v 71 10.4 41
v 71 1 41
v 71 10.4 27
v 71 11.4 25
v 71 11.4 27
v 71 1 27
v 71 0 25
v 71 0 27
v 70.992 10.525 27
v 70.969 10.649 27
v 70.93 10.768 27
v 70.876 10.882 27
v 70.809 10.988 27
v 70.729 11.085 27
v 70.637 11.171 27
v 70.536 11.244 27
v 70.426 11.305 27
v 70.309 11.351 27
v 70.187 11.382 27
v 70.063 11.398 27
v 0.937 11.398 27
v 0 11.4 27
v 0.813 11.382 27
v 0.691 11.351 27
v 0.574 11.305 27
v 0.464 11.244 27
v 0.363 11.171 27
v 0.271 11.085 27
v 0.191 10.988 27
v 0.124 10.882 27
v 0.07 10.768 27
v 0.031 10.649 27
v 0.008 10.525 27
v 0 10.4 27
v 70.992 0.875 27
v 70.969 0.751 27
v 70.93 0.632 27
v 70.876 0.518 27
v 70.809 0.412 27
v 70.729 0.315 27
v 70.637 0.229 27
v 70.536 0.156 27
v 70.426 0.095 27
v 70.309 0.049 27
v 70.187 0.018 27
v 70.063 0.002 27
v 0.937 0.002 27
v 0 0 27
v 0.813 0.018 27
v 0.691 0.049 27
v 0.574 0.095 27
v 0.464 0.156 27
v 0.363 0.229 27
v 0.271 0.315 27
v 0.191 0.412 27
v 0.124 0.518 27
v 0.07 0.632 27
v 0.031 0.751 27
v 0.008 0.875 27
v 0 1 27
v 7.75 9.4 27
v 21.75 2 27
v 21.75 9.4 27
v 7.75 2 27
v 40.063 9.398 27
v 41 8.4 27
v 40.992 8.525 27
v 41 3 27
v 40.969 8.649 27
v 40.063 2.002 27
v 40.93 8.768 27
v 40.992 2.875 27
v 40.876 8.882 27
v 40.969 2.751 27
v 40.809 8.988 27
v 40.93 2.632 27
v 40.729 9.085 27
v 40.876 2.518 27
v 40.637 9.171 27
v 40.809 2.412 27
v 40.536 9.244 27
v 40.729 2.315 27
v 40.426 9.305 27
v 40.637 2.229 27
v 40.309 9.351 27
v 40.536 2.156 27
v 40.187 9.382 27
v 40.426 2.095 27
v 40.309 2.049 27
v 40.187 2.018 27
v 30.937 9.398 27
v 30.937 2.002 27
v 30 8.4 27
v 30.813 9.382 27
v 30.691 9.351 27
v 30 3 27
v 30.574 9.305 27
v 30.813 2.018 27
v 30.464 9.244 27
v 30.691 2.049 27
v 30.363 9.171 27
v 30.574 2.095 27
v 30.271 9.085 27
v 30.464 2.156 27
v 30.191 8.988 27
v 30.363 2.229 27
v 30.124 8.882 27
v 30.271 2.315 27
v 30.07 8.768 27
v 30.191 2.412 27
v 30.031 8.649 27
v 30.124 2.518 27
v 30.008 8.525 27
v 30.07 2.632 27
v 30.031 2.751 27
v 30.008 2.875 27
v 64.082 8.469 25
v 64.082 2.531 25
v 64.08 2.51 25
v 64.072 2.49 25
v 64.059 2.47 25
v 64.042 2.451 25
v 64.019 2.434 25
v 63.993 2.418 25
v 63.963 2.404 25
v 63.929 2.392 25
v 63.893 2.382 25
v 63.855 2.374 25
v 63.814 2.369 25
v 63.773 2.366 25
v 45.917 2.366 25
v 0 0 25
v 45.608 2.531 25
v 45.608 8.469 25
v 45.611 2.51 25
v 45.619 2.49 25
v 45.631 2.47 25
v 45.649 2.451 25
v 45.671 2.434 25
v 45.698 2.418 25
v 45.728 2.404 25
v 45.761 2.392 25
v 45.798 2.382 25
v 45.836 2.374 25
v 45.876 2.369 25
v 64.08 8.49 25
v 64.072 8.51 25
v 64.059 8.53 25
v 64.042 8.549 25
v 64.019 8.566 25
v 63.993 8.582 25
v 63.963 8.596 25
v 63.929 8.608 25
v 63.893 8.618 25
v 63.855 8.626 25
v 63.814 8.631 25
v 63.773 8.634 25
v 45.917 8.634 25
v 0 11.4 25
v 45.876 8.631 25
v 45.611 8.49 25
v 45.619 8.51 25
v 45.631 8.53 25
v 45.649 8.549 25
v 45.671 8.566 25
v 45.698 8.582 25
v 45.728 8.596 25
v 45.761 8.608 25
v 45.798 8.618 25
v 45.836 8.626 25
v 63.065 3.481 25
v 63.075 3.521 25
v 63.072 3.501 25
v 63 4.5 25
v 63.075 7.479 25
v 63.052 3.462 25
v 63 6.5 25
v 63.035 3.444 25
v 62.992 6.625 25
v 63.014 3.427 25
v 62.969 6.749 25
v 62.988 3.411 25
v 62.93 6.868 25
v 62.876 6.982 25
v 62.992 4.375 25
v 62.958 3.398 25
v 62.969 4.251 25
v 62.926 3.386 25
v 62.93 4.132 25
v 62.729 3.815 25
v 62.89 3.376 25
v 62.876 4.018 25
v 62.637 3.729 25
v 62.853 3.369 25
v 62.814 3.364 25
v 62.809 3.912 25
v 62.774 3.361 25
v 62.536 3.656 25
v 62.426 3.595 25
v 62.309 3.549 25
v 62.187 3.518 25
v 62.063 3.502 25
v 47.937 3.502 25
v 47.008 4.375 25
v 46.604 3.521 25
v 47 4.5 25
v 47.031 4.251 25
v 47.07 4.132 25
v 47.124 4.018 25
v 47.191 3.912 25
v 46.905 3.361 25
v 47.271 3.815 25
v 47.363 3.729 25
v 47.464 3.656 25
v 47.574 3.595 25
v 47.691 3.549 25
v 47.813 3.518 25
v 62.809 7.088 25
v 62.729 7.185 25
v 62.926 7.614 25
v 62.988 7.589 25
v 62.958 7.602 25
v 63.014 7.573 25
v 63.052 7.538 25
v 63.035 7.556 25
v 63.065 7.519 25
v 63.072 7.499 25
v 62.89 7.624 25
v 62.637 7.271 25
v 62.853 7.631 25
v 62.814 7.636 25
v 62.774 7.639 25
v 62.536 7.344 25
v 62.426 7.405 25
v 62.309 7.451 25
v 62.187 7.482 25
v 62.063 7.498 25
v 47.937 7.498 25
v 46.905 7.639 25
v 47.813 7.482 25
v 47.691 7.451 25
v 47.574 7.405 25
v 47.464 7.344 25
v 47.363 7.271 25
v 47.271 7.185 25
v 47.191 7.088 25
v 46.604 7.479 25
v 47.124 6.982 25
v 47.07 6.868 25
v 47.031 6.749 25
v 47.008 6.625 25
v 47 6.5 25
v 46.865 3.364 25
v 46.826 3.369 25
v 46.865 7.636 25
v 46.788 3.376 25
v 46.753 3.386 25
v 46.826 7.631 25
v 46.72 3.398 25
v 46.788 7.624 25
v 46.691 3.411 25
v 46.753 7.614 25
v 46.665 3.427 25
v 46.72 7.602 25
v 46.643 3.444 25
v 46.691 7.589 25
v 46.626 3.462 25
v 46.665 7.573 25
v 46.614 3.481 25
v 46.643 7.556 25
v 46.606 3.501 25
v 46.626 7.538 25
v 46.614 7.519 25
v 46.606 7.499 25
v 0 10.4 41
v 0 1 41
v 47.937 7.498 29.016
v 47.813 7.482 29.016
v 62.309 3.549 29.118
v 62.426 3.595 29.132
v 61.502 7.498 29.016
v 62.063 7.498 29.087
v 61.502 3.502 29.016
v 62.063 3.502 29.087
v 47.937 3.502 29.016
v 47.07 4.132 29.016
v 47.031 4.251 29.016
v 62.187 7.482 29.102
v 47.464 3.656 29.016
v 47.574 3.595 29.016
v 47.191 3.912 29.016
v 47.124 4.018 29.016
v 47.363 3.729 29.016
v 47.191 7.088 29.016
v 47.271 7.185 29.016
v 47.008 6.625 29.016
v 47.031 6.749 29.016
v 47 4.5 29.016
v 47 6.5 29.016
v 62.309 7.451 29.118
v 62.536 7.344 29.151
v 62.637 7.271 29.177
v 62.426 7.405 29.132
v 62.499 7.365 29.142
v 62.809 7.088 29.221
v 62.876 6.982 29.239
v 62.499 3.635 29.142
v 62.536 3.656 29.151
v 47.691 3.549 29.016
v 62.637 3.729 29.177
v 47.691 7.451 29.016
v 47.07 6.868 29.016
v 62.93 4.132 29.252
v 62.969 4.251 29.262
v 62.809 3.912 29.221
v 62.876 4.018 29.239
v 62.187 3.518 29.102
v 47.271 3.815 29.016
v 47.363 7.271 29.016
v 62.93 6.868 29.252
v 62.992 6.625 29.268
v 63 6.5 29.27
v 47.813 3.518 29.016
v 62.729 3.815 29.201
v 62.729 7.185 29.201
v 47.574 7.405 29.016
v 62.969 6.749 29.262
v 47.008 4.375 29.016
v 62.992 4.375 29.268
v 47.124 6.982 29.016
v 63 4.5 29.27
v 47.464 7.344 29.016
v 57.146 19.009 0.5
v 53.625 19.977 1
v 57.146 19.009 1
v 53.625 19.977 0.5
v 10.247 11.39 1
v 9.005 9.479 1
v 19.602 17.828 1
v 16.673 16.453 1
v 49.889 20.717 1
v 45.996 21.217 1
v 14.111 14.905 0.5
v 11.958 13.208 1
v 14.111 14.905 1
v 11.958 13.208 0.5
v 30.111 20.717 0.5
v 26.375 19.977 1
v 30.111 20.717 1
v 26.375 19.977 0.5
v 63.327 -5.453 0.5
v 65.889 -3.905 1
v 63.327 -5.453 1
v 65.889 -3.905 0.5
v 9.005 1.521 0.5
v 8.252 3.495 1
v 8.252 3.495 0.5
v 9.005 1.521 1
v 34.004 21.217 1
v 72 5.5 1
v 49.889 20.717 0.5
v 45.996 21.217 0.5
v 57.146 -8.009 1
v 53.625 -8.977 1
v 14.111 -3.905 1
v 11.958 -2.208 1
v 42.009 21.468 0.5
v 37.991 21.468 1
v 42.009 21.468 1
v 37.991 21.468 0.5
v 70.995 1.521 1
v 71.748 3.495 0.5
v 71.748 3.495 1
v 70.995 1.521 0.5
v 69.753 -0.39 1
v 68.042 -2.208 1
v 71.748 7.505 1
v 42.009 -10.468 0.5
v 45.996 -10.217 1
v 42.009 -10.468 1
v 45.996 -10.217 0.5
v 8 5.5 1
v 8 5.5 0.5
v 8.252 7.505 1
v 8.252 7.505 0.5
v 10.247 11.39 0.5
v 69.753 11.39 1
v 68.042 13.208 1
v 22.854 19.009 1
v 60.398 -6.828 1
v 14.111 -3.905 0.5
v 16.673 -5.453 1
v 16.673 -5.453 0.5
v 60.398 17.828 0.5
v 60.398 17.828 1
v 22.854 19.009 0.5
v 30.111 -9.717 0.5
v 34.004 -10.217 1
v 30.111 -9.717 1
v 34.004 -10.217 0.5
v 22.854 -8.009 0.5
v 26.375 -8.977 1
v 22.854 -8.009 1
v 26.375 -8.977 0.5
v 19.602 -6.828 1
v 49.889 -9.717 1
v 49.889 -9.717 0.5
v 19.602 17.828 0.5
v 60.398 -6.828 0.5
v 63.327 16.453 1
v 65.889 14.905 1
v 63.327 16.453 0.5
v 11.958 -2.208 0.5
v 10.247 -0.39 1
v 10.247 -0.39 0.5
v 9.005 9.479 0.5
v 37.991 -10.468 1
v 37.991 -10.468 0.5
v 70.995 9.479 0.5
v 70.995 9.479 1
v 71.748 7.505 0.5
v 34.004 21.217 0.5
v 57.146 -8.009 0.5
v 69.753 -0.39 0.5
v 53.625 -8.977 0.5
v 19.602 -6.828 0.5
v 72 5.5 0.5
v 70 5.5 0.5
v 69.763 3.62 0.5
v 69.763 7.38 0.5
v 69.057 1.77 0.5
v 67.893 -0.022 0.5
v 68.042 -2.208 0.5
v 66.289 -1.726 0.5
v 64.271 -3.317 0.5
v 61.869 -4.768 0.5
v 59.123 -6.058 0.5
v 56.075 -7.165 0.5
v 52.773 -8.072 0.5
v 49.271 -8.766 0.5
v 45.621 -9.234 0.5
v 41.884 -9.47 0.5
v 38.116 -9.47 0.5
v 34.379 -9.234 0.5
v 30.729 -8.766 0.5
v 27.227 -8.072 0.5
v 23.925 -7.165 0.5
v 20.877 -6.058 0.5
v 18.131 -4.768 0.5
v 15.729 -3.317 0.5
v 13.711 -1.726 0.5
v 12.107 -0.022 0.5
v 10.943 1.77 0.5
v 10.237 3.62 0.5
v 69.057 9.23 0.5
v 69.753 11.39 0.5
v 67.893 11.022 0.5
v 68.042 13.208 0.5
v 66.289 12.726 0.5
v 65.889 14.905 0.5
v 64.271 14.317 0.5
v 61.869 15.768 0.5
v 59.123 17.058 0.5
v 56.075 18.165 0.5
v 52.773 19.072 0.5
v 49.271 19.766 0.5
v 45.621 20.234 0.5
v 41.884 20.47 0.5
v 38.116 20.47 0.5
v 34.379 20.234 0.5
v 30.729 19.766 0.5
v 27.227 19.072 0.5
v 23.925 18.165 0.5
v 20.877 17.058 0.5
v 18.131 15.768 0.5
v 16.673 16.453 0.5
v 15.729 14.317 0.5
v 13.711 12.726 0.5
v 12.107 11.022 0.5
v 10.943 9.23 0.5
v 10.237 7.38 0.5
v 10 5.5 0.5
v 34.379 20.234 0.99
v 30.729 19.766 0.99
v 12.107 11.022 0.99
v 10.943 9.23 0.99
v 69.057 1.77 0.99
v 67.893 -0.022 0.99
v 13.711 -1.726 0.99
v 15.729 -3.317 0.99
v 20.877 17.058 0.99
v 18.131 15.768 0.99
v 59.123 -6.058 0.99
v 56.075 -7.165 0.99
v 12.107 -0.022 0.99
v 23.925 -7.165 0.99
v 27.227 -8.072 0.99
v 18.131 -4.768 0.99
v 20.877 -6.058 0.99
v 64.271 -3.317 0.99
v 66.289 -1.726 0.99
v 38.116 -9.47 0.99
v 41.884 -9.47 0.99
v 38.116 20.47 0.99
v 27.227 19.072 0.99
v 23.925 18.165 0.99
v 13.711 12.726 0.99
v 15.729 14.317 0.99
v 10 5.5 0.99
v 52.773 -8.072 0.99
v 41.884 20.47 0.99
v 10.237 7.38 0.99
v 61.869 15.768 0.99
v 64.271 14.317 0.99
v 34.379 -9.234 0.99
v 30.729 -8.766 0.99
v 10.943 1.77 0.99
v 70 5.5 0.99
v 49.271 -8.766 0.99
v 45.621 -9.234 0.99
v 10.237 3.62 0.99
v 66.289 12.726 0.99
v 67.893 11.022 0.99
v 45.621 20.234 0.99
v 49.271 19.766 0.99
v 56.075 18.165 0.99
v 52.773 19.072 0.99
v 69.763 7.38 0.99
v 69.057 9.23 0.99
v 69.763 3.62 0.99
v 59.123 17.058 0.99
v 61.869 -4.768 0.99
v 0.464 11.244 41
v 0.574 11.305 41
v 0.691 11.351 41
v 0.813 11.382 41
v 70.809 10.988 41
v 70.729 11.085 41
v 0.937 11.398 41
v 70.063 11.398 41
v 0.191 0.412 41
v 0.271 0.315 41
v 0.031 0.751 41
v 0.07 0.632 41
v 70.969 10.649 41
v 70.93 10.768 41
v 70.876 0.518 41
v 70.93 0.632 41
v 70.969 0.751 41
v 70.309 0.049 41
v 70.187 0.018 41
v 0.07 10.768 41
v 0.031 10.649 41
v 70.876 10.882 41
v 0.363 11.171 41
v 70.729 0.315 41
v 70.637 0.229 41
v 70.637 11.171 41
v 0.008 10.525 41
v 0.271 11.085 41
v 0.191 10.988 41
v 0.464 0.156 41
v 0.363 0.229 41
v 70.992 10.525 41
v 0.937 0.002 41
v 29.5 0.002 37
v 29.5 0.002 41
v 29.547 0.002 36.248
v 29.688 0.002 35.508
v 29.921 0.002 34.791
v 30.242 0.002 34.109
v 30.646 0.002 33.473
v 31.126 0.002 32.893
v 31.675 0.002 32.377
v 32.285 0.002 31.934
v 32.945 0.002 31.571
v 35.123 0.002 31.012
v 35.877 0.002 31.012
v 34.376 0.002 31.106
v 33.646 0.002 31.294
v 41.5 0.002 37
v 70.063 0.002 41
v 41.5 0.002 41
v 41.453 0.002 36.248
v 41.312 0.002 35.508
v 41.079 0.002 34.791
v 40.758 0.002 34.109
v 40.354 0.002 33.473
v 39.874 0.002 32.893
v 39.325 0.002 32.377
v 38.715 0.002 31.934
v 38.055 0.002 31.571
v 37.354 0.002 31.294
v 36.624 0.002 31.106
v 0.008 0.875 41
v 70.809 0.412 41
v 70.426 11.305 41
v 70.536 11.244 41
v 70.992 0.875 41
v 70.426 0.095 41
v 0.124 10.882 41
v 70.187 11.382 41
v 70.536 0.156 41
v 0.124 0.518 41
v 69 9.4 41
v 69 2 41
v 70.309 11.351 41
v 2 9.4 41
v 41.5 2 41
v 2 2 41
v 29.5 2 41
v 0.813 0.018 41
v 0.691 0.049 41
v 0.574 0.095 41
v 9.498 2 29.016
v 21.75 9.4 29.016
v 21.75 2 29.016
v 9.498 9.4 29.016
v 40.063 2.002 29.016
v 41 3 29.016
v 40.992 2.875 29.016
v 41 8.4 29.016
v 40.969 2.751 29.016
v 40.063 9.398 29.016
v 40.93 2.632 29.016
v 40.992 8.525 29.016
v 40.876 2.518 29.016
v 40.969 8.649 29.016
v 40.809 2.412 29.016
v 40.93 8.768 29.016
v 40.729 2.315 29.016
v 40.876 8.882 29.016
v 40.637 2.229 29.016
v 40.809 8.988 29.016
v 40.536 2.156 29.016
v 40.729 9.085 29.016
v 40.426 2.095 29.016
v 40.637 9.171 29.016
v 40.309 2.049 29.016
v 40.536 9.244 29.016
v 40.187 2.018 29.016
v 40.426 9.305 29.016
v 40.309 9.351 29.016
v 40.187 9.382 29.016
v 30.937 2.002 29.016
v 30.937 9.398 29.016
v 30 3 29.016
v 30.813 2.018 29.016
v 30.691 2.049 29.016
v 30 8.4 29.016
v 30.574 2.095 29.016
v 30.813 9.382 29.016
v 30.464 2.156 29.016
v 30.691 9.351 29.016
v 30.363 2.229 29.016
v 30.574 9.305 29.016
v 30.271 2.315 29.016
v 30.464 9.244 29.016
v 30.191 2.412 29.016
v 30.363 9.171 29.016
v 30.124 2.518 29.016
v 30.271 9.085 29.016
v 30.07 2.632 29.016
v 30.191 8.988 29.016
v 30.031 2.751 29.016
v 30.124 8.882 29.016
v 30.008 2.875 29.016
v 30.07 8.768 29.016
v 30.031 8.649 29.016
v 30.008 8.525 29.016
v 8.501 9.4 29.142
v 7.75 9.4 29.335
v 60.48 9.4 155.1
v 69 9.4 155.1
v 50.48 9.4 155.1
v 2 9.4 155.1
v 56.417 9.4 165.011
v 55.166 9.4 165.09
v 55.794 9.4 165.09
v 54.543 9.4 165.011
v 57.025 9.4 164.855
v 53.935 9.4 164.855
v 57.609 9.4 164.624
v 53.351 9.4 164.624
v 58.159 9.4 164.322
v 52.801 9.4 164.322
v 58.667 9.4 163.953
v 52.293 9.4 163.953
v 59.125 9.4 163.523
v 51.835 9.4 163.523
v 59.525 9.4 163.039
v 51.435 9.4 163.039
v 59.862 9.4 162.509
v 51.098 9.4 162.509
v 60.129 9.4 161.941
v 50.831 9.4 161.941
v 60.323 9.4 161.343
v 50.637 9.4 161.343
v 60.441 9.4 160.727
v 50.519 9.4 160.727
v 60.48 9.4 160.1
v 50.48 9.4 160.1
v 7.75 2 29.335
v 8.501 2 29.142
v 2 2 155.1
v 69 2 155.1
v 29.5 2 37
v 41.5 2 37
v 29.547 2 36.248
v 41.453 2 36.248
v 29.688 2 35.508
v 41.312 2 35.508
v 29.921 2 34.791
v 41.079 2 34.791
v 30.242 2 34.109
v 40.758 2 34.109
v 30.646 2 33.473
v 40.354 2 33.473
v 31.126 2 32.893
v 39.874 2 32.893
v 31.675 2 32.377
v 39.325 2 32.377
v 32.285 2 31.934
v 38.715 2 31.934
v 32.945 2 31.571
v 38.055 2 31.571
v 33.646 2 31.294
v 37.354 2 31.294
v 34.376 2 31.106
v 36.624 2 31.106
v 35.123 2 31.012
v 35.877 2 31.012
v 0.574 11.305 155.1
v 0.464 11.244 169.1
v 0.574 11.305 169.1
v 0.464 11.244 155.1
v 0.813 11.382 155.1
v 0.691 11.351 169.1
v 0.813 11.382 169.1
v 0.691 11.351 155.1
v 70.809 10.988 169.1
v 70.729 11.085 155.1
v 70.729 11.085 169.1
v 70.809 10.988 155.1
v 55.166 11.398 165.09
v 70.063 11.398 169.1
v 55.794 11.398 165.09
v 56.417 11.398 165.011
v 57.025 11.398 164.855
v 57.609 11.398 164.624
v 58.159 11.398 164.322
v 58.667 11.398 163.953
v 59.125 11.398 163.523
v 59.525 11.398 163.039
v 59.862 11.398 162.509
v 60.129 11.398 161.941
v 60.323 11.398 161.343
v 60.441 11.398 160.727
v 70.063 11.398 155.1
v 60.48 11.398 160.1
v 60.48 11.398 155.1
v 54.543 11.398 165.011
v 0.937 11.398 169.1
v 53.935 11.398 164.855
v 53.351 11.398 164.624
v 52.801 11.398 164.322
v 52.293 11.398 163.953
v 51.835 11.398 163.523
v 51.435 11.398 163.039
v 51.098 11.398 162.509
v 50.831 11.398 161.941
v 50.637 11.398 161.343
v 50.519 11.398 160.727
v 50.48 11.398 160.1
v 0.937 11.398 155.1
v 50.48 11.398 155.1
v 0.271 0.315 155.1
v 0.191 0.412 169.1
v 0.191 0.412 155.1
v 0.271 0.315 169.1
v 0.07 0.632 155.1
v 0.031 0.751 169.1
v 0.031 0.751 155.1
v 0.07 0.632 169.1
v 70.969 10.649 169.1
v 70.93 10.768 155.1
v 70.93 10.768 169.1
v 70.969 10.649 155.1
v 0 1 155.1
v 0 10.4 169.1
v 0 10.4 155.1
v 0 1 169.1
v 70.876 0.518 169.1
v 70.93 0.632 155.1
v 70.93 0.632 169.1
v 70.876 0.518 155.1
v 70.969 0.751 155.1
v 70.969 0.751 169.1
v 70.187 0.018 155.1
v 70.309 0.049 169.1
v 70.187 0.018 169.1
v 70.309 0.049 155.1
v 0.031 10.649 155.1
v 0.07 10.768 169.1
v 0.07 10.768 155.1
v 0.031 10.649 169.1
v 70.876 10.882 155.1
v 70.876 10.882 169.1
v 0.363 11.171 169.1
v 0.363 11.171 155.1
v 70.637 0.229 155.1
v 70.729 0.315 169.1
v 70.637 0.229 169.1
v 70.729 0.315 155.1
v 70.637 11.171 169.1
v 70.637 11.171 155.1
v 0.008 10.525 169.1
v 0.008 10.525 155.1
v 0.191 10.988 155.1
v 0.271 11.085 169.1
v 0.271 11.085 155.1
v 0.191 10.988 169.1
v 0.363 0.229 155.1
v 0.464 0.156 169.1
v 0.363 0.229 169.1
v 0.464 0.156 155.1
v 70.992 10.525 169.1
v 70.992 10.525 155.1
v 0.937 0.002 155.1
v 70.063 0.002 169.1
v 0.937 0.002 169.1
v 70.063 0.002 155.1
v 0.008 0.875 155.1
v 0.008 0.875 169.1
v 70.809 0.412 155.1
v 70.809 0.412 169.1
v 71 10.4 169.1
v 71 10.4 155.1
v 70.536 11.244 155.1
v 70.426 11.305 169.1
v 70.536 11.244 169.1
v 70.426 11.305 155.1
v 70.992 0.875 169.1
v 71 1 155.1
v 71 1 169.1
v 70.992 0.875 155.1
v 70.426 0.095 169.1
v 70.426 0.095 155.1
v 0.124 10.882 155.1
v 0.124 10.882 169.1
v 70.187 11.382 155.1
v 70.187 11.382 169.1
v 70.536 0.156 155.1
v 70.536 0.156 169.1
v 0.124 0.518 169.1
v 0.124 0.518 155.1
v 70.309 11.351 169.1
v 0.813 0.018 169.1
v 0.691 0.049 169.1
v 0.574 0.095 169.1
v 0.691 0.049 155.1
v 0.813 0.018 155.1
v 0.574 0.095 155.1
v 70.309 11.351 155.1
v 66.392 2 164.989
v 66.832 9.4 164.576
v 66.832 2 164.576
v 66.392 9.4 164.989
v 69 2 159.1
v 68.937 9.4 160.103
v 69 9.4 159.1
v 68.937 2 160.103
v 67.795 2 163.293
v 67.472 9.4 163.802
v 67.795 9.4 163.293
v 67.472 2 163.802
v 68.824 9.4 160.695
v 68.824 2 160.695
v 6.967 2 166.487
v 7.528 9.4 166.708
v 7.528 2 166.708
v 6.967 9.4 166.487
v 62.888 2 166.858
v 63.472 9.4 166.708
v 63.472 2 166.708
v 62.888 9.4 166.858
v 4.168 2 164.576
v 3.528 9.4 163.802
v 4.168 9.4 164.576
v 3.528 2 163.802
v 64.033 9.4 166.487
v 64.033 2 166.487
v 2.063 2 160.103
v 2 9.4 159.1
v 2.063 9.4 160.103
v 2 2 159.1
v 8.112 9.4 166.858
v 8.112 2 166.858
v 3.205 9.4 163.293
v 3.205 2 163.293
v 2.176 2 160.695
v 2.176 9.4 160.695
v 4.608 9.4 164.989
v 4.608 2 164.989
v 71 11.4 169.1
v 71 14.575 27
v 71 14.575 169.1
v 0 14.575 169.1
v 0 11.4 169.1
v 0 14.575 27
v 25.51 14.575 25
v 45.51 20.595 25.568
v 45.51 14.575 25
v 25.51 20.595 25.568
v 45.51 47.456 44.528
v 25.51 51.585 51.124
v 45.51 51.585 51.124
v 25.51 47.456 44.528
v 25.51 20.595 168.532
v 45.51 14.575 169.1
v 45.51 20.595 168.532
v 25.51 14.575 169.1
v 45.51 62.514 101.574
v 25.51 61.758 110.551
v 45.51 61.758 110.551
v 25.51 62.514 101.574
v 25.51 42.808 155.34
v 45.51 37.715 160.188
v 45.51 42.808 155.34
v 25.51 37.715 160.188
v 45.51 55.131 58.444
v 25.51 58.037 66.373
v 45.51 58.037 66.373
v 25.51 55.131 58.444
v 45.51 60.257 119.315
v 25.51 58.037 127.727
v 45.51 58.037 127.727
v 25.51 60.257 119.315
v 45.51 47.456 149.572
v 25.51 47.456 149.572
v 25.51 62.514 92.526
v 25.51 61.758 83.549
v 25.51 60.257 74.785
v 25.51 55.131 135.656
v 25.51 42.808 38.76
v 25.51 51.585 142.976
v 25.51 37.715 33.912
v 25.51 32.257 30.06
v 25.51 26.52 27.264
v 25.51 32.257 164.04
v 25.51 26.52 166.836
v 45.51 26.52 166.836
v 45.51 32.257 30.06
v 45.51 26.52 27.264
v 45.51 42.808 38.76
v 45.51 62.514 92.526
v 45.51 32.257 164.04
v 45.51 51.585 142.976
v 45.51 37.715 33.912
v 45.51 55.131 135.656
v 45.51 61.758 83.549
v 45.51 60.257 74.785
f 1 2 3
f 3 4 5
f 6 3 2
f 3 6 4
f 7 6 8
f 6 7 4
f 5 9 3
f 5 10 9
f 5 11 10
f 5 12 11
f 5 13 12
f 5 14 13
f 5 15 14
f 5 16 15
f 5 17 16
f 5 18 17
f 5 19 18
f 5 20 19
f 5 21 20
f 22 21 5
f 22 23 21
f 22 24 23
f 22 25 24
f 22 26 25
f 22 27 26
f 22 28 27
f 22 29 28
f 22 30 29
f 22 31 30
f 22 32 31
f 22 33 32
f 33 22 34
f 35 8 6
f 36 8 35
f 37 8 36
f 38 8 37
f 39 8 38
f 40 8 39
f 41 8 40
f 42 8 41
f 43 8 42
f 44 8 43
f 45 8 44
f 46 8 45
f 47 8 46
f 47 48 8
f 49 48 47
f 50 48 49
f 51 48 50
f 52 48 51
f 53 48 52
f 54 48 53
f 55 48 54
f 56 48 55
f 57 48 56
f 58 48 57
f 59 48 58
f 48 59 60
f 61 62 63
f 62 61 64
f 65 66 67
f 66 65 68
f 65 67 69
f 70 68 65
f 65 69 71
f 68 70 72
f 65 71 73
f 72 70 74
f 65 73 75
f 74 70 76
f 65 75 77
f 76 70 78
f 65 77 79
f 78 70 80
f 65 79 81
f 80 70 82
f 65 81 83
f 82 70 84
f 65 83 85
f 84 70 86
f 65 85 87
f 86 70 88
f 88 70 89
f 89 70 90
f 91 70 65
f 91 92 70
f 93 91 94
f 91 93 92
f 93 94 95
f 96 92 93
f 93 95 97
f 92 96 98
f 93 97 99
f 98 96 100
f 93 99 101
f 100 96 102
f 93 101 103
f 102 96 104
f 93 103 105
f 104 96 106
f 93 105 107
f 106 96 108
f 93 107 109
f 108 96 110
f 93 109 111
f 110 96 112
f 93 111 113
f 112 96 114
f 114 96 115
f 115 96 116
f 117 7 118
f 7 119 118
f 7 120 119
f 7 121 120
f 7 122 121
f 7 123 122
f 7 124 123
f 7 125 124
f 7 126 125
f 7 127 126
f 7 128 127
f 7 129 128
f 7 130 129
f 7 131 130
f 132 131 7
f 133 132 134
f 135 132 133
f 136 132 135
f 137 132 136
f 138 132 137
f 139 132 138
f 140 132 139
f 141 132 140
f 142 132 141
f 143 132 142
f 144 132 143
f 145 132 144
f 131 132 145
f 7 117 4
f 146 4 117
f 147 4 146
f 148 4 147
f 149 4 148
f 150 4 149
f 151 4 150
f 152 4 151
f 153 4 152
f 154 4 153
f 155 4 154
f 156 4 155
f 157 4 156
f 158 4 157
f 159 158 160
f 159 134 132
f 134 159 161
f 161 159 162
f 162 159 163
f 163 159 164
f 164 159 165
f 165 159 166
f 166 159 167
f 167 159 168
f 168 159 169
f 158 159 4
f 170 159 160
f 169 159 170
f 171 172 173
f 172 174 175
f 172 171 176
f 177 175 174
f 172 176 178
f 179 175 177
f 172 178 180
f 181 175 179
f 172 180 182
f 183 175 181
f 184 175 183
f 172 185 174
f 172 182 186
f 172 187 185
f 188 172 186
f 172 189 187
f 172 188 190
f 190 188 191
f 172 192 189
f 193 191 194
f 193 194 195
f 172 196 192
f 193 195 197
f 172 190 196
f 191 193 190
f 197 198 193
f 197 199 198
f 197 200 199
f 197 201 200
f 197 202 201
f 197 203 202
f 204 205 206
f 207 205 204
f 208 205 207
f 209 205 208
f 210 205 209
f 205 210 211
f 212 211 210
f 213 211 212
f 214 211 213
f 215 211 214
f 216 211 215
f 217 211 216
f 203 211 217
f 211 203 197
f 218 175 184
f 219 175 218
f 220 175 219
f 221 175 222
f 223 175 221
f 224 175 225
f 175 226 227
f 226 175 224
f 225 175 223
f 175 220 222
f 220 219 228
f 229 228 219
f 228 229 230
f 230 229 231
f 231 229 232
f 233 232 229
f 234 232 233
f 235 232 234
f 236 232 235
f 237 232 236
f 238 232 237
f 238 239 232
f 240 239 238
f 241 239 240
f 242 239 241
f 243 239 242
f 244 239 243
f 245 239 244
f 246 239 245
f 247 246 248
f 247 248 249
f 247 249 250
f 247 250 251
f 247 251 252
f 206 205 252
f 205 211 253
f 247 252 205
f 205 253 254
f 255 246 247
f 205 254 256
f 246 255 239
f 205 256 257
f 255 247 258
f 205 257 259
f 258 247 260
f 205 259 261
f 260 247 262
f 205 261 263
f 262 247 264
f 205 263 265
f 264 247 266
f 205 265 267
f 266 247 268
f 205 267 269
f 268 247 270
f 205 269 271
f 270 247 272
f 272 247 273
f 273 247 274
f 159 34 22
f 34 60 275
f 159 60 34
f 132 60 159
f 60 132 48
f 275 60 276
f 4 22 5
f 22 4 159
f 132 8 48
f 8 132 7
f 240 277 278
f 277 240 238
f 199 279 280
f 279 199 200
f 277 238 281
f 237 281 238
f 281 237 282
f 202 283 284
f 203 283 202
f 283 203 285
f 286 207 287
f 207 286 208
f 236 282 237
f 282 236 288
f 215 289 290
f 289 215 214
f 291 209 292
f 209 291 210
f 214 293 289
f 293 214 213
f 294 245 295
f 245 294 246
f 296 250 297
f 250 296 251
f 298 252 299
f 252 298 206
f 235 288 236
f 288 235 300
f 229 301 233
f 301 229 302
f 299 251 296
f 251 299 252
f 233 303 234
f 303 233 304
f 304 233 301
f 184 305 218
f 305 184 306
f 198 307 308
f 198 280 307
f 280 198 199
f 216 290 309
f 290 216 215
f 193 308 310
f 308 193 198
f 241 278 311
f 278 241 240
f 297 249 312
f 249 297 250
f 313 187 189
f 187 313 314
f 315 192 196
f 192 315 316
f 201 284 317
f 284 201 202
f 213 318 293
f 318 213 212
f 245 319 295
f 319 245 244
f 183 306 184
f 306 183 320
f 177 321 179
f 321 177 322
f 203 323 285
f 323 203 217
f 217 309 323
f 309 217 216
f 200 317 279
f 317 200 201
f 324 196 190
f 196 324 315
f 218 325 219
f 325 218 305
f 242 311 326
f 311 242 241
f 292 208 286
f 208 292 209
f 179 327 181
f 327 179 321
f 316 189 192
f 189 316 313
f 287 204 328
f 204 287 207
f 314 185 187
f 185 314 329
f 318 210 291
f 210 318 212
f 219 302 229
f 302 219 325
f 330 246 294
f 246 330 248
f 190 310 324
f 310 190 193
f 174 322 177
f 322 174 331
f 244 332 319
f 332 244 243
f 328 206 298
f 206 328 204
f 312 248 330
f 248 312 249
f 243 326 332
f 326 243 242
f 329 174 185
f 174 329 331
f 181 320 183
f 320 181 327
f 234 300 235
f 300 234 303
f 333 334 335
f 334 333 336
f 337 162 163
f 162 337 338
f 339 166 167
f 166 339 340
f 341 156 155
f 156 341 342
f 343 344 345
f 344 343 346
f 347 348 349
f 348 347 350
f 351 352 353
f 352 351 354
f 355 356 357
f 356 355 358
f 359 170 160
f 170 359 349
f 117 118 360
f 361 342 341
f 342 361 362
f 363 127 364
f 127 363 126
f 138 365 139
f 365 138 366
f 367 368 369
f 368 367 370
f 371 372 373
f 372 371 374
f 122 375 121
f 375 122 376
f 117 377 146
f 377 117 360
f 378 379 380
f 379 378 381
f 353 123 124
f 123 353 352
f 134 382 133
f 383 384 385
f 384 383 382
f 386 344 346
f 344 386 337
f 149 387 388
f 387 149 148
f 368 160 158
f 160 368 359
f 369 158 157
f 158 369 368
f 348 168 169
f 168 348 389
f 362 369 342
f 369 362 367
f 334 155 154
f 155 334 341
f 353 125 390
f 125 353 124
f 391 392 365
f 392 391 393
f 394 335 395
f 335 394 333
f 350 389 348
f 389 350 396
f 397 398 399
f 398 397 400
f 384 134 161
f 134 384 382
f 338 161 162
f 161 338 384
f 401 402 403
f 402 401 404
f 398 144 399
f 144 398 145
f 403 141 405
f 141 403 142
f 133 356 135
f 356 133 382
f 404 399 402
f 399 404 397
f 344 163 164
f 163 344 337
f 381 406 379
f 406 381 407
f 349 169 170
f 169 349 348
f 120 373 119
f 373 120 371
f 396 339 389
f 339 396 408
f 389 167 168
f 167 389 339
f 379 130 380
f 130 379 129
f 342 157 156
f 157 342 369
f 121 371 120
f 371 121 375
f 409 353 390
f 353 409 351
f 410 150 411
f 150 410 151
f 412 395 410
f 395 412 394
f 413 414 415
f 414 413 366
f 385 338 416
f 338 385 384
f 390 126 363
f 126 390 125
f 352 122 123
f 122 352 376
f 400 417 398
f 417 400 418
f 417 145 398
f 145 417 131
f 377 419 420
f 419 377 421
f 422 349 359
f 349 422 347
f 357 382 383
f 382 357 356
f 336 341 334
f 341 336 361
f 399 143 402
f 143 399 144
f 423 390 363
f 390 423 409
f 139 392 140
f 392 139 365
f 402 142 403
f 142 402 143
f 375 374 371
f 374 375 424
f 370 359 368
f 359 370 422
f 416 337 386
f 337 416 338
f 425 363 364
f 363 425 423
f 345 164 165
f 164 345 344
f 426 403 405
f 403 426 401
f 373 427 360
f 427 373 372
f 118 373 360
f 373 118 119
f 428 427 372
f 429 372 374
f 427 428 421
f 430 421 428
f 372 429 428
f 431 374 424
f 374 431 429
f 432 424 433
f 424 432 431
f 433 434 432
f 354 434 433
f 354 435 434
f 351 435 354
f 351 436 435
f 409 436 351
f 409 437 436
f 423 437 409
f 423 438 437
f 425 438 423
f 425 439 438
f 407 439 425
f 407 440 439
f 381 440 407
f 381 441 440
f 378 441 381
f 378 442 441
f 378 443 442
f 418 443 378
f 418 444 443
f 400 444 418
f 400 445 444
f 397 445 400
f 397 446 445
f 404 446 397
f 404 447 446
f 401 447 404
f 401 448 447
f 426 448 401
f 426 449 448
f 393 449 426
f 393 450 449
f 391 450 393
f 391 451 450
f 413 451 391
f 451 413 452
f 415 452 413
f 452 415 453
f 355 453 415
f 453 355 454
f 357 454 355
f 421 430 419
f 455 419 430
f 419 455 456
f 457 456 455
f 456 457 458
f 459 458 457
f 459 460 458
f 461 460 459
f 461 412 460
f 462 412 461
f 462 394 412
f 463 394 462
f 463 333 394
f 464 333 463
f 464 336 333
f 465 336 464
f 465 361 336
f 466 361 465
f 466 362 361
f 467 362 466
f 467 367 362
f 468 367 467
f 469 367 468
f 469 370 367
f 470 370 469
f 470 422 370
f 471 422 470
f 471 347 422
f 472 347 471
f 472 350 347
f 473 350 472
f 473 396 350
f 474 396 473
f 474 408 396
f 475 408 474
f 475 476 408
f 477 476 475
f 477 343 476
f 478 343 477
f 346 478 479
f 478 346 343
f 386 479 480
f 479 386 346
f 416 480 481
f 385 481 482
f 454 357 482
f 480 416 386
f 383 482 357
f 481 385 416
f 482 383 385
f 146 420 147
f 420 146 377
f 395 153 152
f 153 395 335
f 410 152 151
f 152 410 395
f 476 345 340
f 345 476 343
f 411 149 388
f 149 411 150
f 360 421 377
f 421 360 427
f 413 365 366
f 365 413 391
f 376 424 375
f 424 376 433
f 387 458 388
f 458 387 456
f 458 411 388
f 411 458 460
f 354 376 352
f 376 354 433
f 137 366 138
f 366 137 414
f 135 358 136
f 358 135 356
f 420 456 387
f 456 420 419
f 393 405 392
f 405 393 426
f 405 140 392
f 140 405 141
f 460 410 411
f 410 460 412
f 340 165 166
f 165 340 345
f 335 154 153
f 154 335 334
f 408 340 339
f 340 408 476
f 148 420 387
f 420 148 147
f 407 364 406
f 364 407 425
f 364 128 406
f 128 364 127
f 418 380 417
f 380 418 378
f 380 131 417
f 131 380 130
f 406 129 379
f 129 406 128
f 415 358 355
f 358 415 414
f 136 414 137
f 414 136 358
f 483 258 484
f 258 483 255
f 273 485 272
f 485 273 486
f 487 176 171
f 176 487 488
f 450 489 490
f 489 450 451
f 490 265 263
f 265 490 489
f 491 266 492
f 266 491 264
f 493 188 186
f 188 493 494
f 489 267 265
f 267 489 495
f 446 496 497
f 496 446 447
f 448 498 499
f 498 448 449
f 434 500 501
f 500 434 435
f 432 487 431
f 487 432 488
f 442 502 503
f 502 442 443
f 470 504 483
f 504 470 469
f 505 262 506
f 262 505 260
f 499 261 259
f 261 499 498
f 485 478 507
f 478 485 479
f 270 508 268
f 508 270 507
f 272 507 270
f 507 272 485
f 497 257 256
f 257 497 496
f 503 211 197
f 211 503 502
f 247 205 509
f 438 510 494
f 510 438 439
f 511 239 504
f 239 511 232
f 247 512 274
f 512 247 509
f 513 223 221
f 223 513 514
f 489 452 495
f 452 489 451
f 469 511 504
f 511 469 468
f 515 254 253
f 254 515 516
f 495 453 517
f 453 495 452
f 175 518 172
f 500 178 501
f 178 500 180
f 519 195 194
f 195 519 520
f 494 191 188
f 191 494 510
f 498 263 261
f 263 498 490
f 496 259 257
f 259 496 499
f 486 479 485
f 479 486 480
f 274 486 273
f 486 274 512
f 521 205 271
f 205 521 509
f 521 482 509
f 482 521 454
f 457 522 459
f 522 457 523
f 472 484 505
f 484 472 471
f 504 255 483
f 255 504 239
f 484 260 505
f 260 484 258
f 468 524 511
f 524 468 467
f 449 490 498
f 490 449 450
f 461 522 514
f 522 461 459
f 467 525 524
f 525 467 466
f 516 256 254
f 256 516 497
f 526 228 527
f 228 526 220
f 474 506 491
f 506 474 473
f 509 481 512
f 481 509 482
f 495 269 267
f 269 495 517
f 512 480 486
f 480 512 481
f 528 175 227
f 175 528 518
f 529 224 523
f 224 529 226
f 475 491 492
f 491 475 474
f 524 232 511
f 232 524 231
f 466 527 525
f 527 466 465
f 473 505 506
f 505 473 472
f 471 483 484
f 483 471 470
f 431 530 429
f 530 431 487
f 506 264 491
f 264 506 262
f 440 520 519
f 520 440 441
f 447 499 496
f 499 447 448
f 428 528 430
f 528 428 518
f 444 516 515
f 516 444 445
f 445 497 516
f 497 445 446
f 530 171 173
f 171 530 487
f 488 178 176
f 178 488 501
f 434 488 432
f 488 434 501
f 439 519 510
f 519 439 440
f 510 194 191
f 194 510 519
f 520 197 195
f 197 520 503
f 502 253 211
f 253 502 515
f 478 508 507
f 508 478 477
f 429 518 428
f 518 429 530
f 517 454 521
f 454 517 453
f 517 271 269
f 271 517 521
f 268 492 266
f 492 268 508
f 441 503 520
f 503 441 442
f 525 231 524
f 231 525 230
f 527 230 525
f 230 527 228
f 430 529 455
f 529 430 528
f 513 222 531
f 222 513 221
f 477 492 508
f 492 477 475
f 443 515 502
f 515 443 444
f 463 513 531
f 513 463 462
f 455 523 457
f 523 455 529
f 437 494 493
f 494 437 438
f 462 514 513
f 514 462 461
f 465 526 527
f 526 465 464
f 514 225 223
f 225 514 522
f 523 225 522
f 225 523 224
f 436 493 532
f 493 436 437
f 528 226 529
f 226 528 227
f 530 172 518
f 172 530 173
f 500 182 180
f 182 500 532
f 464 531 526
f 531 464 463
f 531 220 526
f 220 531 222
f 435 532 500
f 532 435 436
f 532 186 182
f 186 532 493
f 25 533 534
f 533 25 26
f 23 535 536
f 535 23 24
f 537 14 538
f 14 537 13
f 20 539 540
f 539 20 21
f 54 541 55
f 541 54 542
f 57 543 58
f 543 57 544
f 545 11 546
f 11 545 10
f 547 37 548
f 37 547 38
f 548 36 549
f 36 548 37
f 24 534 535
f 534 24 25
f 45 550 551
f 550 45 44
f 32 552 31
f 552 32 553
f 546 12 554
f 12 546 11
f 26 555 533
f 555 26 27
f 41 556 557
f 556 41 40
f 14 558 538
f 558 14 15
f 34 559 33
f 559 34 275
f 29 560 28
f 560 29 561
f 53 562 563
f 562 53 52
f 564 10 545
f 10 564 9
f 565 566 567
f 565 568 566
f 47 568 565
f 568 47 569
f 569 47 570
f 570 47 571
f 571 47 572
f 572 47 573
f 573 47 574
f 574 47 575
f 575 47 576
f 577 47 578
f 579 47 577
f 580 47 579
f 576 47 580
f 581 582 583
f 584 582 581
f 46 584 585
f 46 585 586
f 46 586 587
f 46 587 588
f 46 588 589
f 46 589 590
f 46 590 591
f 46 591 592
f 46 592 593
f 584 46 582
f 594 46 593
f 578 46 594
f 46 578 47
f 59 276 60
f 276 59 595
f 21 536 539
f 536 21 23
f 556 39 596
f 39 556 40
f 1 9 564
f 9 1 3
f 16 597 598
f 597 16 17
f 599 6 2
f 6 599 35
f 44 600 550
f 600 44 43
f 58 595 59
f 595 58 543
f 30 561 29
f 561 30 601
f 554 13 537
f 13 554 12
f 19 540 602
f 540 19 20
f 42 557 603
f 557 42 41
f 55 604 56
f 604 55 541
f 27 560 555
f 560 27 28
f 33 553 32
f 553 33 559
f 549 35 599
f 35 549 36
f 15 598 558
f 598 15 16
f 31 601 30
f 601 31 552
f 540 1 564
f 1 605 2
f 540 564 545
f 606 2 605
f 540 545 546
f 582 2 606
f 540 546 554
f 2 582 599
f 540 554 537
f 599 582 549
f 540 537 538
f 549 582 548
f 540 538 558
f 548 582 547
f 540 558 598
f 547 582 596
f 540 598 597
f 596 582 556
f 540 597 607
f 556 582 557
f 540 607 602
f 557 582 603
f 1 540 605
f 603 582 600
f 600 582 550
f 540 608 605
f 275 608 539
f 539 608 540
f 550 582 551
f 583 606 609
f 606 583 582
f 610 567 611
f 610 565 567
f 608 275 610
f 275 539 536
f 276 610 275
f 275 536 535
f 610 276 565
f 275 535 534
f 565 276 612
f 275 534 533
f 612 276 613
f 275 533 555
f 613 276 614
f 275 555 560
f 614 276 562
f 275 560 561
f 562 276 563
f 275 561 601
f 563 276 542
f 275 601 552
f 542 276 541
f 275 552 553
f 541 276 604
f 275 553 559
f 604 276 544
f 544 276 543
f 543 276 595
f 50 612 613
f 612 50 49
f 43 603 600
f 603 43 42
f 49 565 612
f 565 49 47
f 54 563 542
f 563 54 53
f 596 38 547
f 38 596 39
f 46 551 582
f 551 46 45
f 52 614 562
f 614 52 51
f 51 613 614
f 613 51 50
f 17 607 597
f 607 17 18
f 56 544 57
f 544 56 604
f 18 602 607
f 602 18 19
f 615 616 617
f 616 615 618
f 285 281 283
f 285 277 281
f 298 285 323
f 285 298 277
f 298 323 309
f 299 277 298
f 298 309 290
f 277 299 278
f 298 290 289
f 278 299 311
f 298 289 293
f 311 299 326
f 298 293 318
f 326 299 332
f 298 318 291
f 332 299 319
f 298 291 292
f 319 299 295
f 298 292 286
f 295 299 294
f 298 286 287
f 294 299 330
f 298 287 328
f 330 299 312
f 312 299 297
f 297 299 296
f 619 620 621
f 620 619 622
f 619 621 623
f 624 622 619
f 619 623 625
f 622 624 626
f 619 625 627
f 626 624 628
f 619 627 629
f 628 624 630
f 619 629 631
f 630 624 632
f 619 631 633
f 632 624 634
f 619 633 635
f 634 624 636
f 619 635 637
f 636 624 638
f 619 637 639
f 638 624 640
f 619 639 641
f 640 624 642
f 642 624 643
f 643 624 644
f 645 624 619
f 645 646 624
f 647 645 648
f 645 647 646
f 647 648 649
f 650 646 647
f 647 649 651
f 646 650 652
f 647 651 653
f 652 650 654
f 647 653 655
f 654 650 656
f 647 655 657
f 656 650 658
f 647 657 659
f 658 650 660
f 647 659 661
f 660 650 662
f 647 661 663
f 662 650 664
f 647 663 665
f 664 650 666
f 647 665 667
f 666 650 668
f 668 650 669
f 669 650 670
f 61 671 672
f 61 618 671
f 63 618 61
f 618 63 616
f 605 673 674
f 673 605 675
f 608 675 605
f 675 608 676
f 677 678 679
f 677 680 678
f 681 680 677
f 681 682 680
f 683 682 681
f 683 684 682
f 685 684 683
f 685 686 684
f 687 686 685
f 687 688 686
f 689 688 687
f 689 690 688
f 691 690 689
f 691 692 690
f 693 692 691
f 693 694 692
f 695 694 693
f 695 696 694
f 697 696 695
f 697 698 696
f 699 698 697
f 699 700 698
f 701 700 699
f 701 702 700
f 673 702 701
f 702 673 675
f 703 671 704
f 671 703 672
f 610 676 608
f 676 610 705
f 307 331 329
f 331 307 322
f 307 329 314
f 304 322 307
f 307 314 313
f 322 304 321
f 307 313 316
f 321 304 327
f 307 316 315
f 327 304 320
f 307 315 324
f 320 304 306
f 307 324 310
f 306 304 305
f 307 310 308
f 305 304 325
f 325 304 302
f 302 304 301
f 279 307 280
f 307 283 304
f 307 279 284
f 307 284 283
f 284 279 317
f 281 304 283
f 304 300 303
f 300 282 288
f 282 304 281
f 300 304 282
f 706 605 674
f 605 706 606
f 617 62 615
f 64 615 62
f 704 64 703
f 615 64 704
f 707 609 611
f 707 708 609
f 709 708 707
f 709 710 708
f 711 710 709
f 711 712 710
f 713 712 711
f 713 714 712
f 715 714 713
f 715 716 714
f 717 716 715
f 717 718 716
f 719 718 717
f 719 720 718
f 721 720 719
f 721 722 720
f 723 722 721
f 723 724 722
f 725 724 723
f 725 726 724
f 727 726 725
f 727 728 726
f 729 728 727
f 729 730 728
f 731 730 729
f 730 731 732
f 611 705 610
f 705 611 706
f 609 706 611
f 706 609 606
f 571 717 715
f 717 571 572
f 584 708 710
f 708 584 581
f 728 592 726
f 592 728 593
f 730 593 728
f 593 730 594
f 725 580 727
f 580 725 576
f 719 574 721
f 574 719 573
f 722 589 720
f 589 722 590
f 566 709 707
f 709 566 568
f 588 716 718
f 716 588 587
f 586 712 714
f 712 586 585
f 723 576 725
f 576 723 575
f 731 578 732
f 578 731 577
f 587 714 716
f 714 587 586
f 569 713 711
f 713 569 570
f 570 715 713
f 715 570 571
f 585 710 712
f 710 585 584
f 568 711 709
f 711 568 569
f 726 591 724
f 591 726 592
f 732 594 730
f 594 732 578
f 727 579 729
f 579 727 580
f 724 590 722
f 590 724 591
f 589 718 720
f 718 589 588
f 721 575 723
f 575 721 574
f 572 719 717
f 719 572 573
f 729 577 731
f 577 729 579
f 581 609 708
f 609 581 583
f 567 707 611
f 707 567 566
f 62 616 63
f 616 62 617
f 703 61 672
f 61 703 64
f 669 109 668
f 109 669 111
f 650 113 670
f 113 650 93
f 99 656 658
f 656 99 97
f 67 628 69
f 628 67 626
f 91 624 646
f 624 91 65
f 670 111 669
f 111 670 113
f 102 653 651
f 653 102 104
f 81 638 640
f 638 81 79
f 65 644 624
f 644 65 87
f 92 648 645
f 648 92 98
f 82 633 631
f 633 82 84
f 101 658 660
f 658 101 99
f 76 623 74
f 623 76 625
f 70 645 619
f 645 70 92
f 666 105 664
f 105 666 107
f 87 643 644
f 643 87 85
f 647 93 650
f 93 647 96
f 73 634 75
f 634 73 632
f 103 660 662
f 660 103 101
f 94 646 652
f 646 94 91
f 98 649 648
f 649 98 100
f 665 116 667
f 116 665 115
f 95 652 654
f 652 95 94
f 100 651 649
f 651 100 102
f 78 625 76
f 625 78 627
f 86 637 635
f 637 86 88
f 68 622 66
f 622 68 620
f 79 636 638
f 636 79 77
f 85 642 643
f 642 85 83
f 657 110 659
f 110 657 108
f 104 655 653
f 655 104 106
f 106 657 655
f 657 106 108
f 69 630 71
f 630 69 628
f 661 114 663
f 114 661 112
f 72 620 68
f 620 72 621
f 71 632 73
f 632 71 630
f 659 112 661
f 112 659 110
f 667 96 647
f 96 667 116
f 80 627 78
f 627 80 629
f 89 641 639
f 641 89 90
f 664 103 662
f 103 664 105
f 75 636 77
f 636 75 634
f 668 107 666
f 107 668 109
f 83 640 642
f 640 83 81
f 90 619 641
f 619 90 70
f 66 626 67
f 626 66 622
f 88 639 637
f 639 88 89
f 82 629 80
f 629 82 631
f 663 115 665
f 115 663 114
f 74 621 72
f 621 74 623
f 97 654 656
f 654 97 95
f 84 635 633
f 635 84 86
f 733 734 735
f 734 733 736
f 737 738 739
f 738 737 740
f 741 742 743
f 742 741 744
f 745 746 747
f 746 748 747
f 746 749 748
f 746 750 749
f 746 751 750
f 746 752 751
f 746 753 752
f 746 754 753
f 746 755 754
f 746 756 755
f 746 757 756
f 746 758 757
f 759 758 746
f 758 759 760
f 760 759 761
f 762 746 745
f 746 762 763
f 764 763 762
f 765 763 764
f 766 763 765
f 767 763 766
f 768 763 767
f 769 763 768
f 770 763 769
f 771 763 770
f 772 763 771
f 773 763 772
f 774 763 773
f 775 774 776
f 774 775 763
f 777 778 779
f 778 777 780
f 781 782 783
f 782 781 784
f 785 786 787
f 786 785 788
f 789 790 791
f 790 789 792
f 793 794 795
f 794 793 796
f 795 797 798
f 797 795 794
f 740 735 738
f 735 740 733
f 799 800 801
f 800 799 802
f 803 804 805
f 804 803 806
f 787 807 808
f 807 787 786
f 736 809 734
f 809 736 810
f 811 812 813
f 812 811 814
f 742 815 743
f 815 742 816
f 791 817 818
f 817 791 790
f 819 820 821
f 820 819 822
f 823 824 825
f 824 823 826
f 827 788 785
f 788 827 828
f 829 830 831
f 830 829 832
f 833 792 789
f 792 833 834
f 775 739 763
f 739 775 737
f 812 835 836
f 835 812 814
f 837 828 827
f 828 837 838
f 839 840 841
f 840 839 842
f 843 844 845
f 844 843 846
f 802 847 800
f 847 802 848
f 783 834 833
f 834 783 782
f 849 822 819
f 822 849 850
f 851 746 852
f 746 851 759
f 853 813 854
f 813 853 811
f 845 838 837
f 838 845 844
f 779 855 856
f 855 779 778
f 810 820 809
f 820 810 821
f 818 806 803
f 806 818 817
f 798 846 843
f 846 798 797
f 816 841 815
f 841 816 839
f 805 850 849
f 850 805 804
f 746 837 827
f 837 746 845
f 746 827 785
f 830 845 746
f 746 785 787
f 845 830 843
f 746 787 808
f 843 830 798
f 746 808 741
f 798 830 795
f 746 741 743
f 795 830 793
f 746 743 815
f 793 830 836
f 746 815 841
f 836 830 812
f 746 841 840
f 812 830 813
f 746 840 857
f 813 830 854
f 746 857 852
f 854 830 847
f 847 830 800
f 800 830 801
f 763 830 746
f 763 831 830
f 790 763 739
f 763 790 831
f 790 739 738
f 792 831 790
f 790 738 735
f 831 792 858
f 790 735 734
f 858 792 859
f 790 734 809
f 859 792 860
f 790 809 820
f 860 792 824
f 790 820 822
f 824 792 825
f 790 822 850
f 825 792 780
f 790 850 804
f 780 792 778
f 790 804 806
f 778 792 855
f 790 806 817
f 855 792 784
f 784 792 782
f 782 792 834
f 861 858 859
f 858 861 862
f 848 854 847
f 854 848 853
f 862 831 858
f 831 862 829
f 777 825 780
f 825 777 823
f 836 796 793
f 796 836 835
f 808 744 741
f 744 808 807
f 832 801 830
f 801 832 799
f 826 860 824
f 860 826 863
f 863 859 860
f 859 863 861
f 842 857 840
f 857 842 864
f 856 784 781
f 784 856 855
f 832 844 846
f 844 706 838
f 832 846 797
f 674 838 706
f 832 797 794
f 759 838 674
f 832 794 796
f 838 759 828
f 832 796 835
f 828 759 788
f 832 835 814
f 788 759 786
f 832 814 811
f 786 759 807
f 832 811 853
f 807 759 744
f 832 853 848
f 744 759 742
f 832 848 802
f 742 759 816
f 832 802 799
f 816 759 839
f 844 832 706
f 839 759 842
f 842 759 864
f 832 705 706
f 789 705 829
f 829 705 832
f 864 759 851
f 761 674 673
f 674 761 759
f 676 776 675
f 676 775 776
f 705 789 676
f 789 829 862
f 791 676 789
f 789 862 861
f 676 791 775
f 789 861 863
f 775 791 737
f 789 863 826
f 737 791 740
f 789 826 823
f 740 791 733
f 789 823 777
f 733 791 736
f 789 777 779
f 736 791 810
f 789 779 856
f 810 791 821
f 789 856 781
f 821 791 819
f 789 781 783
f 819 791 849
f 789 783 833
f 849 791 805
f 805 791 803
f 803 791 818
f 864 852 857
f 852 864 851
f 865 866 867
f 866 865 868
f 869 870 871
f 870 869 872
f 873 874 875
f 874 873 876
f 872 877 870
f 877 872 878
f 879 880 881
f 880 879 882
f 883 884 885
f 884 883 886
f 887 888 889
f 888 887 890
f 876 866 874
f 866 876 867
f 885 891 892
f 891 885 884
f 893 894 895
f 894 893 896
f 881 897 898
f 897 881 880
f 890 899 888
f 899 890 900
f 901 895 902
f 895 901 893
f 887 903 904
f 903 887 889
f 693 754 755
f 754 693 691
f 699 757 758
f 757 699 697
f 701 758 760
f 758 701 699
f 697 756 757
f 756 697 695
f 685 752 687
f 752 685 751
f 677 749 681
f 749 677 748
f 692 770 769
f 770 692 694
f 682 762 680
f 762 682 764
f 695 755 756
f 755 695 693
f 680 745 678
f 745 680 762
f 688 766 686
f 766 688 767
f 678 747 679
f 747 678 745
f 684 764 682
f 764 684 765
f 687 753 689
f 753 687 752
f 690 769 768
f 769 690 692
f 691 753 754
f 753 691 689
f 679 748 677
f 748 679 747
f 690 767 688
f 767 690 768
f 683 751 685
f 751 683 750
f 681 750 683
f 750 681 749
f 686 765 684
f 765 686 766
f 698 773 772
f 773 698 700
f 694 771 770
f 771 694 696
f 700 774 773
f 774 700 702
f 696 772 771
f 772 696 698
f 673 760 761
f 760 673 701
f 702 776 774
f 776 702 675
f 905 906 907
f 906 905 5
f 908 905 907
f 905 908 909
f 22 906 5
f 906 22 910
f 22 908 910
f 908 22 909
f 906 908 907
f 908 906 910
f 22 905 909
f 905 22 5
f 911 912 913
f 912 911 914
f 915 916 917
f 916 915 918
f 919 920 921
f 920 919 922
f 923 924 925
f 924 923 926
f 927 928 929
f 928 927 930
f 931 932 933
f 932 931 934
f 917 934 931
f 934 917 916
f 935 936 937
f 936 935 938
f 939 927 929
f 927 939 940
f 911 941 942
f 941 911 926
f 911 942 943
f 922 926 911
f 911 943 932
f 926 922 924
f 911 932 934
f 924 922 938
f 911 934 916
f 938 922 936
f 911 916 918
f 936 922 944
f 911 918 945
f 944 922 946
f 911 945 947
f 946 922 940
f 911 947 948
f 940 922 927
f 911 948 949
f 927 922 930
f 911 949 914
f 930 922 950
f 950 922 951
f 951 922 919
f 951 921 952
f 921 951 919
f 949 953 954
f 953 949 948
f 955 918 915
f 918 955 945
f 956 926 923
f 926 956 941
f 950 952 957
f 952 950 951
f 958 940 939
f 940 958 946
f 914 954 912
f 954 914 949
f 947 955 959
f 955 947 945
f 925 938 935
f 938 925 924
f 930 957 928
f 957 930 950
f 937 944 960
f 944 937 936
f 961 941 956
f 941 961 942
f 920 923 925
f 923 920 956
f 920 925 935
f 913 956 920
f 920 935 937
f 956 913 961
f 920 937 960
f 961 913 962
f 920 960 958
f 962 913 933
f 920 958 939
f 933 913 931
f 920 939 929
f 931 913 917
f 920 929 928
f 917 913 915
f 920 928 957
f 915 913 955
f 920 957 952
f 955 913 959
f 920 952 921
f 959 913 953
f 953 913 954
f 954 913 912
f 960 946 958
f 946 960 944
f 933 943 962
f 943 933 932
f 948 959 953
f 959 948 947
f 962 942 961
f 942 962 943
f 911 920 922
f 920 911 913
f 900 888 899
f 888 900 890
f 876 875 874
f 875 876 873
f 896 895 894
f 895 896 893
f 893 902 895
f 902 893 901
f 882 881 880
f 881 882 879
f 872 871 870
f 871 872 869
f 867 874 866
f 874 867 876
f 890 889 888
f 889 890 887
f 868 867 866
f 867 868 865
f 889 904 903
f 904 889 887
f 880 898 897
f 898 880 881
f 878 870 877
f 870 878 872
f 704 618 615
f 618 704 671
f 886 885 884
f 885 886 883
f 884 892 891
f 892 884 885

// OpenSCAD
// file: ../lib/basics.scad
// ## `basics.scad`
// This library contains basic elements to construct mobile device augmentations.

// ### `roundedCube(dimension,edgeRadius)`
// A cube with rounded edges on the depth axis. This function is helpful for creating simple phone shapes.
// #### Where
// * `dimension=[width,depth,height]`: the size of the cube
// * `edgeRadius`: the radius of the rounded edges 
module roundedCube(dimension=[10,10,10],edgeRadius=1){
    translate([0,dimension[1],0])
		rotate([90,0,0])
			hull(){
        		translate([edgeRadius,edgeRadius,0])
					cylinder(r=edgeRadius,h=dimension[1]);
        		translate([dimension[0]-edgeRadius,edgeRadius,0])
					cylinder(r=edgeRadius,h=dimension[1]);
        		translate([edgeRadius,dimension[2]-edgeRadius,0])
					cylinder(r=edgeRadius,h=dimension[1]);
        		translate([dimension[0]-edgeRadius,dimension[2]-edgeRadius,0])
					cylinder(r=edgeRadius,h=dimension[1]);
    		}
}

// ### `bottomHolder(deviceWidth,deviceDepth,deviceEdgeRadius,deviceHeightInHolder,wallThickness,holderEdgeRadius)`
// A basic generic element to hold the bottom part of a device
// #### Where
// * `deviceWidth`: the width of the device to be held
// * `deviceDepth`: the depth of the device to be held
// * `deviceEdgeRadius`: the edge radius of the device to be held
// * `deviceHeightInHolder`: the height of the part of the holder covering the device
// * `wallThickness`: the holder's wall thickness
// * `holderEdgeRadius`: the holder's edge radius
module bottomHolder(deviceWidth=10,deviceDepth=10,deviceEdgeRadius=1,
deviceHeightInHolder=10,wallThickness=1,holderEdgeRadius=1){
	difference(){
		translate([0,deviceDepth+wallThickness*2,0])
			rotate([90,0,0])
				roundedCube([deviceWidth+wallThickness*2,deviceHeightInHolder+wallThickness,
				deviceDepth+wallThickness*2],holderEdgeRadius);
		translate([wallThickness,wallThickness,wallThickness])
			roundedCube([deviceWidth,deviceDepth,
			deviceHeightInHolder+deviceEdgeRadius],deviceEdgeRadius);
	}
}

// ### `topHolder(deviceWidth,deviceDepth,deviceEdgeRadius,deviceHeightInHolder,wallThickness,lipsWidth,holderEdgeRadius)`
// A basic generic element to hold the top part of a device
// #### Where
// * `deviceWidth`: the width of the device to be held
// * `deviceDepth`: the depth of the device to be held
// * `deviceEdgeRadius`: the edge radius of the device to be held
// * `deviceHeightInHolder`: the height of the part of the holder covering the device
// * `wallThickness`: the holder's wall thickness
// * `lipsWidth`: size of the lips holding the device
// * `holderEdgeRadius`: the holder's edge radius
module topHolder(deviceWidth=10,deviceDepth=10,deviceEdgeRadius=1,deviceHeightInHolder=10,
wallThickness=1,lipsWidth=2,holderEdgeRadius=1){
	difference(){
		translate([0,deviceDepth+wallThickness*2,0])rotate([90,0,0])
			roundedCube([deviceWidth+wallThickness*2,deviceHeightInHolder+wallThickness,
			deviceDepth+wallThickness*2],holderEdgeRadius);
		translate([wallThickness,wallThickness,-wallThickness*2])
			roundedCube([deviceWidth,deviceDepth,deviceHeightInHolder],deviceEdgeRadius);
		//translate([wallThickness+lipsWidth,-0.01,-wallThickness-lipsWidth-0.85]) // TODO: 0.85 wrong here: needs to be fixed
		//	roundedCube([deviceWidth-lipsWidth*2,wallThickness+0.02,deviceHeightInHolder],
	//		deviceEdgeRadius*((deviceWidth-lipsWidth*2)/deviceWidth));
	}
}

// ### `rectangleCircularHorn(rectangleWidth,rectangleHeight,circleRadius,hornLength,wallThickness,hornDeformationFactor,hornDerivation,endsHeight)`
// A horn with a square termination on one side and a circle termination on the other.
// #### Where
// * `rectangleWidth`: the width of the rectangular termination
// * `rectangleHeight`: the height of the rectangular termination
// * `circleRadius`: the radius of the circular termination
// * `hornLength`: the length of the horn
// * `wallThickness`: the thickness of the walls
// * `hornDeformationFactor`: controls the vertical flatness of the horn with (1=perfect circle, >1=flatened circle) 
// * `hornDerivation`: displace the position of the circular end relatively to the rectangular end on the horizontal axis
// * `endsHeight`: the height of the two ends
module rectangleCircularHorn(rectangleWidth=10,rectangleHeight=10,circleRadius=10,hornLength=10,wallThickness=1,
hornDeformationFactor=1,hornDerivation=0,endsHeight=0.5){
	difference(){
		hull(){
			cube([rectangleWidth+wallThickness,rectangleHeight+wallThickness,endsHeight],center=true);
			translate([hornDerivation,0,hornLength-endsHeight*2])
				scale([1,hornDeformationFactor,1])
					cylinder(r=circleRadius+wallThickness,h=endsHeight);
		}
		hull(){
			translate([0,0,-0.01])
				cube([rectangleWidth,rectangleHeight,endsHeight],center=true);
			translate([hornDerivation,0,hornLength-endsHeight*2+0.01])
				scale([1,hornDeformationFactor,1])
					cylinder(r=circleRadius,h=endsHeight);
		}
	}
}

// ### `halfSphere(radius)`
// A half sphere useful to create tops.
// #### Where
// * `radius`: the radius of the half sphere
module halfSphere(radius=10){
	difference(){
		translate([radius,radius,0])sphere(radius);
		translate([0,0,-radius*2])cube([radius*2,radius*2,radius*2]);
	}
}

// ### `halfCylinder(dimension=[10,10,10])`
// A half cylinder with controllable height.
// #### Where
// * `dimension=[width,depth,height]`: the size of the half cylinder
module halfCylinder(dimension=[10,10,10]){
	rotate([-90,0,0])scale([1,dimension[2]/dimension[0],1])difference(){
		translate([dimension[0]/2,0,0.01])cylinder(r=dimension[0]/2,h=dimension[1]);
		cube([dimension[0],dimension[0],dimension[1]+0.02]);
	}
}
// main file
include <../lib/iPhone6.scad>

$fn=50;

iPhone6_CaseRock();
translate([iPhone6_Module_WallThickness,iPhone6_Module_WallThickness,iPhone6_Module_WallThickness+iPhone6_SmallPassiveAmp_HornLength+iPhone6_SmallPassiveAmp_BaseThickness])iPhone6();
